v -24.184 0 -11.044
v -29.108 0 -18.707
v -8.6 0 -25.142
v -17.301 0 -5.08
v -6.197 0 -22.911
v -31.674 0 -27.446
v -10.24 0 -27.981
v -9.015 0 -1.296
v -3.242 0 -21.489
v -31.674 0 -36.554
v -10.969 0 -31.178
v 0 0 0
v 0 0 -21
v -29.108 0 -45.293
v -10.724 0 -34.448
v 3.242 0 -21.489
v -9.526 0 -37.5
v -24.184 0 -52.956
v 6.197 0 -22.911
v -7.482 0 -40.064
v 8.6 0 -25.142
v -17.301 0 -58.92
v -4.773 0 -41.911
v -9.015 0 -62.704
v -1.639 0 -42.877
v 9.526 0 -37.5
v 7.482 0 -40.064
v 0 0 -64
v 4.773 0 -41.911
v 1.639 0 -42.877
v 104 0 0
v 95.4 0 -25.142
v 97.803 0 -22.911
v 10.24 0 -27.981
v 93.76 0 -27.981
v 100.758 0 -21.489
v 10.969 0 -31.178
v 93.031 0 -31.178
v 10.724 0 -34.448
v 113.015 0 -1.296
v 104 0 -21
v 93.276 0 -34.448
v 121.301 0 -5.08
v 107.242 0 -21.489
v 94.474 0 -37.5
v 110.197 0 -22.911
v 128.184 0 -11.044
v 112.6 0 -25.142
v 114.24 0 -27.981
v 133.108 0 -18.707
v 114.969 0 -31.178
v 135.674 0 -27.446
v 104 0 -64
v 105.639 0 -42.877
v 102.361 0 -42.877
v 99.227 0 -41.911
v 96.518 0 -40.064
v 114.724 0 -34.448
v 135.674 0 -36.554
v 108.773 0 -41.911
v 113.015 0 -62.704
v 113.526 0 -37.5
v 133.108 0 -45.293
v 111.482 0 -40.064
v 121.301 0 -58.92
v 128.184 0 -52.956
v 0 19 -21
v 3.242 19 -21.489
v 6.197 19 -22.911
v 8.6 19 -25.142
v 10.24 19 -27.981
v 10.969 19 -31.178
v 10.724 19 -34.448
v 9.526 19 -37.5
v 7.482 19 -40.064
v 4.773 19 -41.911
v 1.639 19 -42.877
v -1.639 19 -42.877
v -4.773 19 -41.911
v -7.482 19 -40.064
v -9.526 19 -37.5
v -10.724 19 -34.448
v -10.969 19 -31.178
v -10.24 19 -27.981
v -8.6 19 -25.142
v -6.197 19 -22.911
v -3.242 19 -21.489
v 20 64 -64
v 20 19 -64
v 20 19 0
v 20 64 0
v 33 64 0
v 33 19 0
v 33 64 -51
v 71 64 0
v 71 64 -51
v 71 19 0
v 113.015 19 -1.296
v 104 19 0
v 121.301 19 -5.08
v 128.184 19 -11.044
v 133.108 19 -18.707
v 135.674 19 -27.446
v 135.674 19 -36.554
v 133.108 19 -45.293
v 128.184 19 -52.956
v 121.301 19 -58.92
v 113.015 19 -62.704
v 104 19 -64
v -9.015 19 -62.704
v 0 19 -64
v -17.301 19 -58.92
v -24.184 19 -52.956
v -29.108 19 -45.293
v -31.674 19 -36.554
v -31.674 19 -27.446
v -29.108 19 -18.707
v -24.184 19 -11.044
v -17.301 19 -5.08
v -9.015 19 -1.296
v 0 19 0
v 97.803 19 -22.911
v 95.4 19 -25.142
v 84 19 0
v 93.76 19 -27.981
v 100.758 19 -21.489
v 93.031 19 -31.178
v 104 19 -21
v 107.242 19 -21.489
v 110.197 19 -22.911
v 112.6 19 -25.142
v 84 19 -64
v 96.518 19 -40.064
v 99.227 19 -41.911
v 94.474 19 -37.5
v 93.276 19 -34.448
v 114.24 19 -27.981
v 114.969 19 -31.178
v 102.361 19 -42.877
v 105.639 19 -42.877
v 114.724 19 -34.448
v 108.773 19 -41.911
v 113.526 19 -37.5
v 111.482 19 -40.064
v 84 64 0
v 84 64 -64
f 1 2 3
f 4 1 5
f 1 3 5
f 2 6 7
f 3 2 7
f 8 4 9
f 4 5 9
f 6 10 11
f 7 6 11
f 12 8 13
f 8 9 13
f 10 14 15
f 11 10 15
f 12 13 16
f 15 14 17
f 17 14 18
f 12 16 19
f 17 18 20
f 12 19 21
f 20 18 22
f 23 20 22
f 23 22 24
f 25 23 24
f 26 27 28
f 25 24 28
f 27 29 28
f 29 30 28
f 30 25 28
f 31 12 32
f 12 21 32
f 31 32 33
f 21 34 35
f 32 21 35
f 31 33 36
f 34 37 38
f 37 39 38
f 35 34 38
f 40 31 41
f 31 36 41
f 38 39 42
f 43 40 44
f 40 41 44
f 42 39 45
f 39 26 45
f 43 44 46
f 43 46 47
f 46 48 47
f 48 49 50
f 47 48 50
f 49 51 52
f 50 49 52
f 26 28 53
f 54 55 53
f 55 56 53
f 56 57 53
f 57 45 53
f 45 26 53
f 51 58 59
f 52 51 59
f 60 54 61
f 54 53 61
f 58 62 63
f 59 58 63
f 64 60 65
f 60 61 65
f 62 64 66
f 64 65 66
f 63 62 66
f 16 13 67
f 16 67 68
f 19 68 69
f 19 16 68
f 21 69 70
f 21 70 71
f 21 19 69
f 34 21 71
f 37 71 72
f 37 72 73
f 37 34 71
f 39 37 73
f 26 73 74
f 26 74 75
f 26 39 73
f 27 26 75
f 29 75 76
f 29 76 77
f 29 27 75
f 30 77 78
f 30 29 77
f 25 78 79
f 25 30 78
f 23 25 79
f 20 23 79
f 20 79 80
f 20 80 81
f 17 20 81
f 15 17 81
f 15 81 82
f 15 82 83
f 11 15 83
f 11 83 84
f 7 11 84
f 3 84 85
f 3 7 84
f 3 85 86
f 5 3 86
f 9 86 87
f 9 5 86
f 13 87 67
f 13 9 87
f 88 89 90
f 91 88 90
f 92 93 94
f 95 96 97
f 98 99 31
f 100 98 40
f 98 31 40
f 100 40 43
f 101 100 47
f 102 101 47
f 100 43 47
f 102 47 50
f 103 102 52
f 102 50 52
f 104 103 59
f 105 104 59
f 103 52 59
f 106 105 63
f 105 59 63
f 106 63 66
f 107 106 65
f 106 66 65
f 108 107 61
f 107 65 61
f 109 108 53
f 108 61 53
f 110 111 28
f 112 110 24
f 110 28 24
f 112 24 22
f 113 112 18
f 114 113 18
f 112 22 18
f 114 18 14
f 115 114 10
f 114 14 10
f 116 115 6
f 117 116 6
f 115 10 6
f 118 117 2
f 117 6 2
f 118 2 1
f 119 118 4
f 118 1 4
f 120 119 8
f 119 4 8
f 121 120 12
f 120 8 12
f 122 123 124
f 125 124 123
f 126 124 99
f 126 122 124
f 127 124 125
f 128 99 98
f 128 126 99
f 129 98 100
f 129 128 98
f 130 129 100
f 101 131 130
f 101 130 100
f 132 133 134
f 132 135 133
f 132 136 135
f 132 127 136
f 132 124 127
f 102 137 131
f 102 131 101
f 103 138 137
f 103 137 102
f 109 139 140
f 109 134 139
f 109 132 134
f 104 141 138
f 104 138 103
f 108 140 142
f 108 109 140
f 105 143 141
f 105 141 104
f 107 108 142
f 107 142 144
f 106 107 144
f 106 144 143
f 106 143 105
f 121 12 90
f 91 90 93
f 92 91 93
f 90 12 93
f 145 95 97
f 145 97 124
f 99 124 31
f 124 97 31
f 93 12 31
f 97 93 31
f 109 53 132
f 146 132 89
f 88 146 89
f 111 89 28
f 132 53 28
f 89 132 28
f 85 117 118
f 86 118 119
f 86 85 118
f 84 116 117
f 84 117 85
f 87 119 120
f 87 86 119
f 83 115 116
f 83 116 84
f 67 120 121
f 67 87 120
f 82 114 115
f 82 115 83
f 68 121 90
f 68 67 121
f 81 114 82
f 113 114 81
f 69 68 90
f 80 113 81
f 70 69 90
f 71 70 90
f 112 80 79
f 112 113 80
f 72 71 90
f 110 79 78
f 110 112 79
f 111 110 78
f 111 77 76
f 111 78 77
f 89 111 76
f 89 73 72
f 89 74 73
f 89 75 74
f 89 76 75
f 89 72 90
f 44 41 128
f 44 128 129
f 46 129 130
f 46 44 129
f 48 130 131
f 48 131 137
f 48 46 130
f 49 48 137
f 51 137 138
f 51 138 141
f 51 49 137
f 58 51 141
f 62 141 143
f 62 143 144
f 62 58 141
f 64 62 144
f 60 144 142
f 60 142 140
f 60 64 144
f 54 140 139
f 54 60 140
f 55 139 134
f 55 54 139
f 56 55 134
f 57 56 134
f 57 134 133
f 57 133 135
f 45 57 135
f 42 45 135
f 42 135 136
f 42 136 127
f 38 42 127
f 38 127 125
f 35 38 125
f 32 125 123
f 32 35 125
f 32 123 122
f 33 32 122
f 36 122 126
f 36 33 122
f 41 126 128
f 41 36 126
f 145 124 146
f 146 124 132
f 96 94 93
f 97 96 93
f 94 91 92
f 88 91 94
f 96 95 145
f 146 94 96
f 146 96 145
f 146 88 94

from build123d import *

# Parameters (mm, degrees)
SKETCH_2_R      = 11
EXTRUDE_1_DEPTH = 19
EXTRUDE_2_DEPTH = 45
EXTRUDE_3_DEPTH = 38


with BuildPart() as part:
    # 스케치2 → 보스-돌출1 (new body)
    with BuildSketch(Plane(origin=(0, 0, 0), x_dir=(1, 0, 0), z_dir=(0, 1, 0))):
        with BuildLine():
            Line((0, 0), (104, 0))
            ThreePointArc((104, 0), (136, 32), (104, 64))
            Line((104, 64), (0, 64))
            ThreePointArc((0, 64), (-32, 32), (0, 0))
        make_face()
        with Locations(Location((0, 32, 0), (0, 0, 270))):
            Circle(SKETCH_2_R, mode=Mode.SUBTRACT)
        with Locations(Location((104, 32, 0), (0, 0, 270))):
            Circle(SKETCH_2_R, mode=Mode.SUBTRACT)
    extrude(amount=EXTRUDE_1_DEPTH)

    # 스케치3 → 보스-돌출2 (add)
    with BuildSketch(Plane(origin=(0, 19, 0), x_dir=(1, 0, 0), z_dir=(0, 1, 0))):
        Polygon((84, 0), (84, 64), (20, 64), (20, 0), (33, 0), (33, 51), (71, 51), (71, 0), align=None)
    extrude(amount=EXTRUDE_2_DEPTH)

    # 스케치6 → 보스-돌출3 (add)
    with BuildSketch(Plane(origin=(33, 0, 0), x_dir=(0, 0, -1), z_dir=(1, 0, 0))):
        Polygon((51, 64), (0, 19), (51, 19), align=None)
    extrude(amount=EXTRUDE_3_DEPTH)


solid = part.part
